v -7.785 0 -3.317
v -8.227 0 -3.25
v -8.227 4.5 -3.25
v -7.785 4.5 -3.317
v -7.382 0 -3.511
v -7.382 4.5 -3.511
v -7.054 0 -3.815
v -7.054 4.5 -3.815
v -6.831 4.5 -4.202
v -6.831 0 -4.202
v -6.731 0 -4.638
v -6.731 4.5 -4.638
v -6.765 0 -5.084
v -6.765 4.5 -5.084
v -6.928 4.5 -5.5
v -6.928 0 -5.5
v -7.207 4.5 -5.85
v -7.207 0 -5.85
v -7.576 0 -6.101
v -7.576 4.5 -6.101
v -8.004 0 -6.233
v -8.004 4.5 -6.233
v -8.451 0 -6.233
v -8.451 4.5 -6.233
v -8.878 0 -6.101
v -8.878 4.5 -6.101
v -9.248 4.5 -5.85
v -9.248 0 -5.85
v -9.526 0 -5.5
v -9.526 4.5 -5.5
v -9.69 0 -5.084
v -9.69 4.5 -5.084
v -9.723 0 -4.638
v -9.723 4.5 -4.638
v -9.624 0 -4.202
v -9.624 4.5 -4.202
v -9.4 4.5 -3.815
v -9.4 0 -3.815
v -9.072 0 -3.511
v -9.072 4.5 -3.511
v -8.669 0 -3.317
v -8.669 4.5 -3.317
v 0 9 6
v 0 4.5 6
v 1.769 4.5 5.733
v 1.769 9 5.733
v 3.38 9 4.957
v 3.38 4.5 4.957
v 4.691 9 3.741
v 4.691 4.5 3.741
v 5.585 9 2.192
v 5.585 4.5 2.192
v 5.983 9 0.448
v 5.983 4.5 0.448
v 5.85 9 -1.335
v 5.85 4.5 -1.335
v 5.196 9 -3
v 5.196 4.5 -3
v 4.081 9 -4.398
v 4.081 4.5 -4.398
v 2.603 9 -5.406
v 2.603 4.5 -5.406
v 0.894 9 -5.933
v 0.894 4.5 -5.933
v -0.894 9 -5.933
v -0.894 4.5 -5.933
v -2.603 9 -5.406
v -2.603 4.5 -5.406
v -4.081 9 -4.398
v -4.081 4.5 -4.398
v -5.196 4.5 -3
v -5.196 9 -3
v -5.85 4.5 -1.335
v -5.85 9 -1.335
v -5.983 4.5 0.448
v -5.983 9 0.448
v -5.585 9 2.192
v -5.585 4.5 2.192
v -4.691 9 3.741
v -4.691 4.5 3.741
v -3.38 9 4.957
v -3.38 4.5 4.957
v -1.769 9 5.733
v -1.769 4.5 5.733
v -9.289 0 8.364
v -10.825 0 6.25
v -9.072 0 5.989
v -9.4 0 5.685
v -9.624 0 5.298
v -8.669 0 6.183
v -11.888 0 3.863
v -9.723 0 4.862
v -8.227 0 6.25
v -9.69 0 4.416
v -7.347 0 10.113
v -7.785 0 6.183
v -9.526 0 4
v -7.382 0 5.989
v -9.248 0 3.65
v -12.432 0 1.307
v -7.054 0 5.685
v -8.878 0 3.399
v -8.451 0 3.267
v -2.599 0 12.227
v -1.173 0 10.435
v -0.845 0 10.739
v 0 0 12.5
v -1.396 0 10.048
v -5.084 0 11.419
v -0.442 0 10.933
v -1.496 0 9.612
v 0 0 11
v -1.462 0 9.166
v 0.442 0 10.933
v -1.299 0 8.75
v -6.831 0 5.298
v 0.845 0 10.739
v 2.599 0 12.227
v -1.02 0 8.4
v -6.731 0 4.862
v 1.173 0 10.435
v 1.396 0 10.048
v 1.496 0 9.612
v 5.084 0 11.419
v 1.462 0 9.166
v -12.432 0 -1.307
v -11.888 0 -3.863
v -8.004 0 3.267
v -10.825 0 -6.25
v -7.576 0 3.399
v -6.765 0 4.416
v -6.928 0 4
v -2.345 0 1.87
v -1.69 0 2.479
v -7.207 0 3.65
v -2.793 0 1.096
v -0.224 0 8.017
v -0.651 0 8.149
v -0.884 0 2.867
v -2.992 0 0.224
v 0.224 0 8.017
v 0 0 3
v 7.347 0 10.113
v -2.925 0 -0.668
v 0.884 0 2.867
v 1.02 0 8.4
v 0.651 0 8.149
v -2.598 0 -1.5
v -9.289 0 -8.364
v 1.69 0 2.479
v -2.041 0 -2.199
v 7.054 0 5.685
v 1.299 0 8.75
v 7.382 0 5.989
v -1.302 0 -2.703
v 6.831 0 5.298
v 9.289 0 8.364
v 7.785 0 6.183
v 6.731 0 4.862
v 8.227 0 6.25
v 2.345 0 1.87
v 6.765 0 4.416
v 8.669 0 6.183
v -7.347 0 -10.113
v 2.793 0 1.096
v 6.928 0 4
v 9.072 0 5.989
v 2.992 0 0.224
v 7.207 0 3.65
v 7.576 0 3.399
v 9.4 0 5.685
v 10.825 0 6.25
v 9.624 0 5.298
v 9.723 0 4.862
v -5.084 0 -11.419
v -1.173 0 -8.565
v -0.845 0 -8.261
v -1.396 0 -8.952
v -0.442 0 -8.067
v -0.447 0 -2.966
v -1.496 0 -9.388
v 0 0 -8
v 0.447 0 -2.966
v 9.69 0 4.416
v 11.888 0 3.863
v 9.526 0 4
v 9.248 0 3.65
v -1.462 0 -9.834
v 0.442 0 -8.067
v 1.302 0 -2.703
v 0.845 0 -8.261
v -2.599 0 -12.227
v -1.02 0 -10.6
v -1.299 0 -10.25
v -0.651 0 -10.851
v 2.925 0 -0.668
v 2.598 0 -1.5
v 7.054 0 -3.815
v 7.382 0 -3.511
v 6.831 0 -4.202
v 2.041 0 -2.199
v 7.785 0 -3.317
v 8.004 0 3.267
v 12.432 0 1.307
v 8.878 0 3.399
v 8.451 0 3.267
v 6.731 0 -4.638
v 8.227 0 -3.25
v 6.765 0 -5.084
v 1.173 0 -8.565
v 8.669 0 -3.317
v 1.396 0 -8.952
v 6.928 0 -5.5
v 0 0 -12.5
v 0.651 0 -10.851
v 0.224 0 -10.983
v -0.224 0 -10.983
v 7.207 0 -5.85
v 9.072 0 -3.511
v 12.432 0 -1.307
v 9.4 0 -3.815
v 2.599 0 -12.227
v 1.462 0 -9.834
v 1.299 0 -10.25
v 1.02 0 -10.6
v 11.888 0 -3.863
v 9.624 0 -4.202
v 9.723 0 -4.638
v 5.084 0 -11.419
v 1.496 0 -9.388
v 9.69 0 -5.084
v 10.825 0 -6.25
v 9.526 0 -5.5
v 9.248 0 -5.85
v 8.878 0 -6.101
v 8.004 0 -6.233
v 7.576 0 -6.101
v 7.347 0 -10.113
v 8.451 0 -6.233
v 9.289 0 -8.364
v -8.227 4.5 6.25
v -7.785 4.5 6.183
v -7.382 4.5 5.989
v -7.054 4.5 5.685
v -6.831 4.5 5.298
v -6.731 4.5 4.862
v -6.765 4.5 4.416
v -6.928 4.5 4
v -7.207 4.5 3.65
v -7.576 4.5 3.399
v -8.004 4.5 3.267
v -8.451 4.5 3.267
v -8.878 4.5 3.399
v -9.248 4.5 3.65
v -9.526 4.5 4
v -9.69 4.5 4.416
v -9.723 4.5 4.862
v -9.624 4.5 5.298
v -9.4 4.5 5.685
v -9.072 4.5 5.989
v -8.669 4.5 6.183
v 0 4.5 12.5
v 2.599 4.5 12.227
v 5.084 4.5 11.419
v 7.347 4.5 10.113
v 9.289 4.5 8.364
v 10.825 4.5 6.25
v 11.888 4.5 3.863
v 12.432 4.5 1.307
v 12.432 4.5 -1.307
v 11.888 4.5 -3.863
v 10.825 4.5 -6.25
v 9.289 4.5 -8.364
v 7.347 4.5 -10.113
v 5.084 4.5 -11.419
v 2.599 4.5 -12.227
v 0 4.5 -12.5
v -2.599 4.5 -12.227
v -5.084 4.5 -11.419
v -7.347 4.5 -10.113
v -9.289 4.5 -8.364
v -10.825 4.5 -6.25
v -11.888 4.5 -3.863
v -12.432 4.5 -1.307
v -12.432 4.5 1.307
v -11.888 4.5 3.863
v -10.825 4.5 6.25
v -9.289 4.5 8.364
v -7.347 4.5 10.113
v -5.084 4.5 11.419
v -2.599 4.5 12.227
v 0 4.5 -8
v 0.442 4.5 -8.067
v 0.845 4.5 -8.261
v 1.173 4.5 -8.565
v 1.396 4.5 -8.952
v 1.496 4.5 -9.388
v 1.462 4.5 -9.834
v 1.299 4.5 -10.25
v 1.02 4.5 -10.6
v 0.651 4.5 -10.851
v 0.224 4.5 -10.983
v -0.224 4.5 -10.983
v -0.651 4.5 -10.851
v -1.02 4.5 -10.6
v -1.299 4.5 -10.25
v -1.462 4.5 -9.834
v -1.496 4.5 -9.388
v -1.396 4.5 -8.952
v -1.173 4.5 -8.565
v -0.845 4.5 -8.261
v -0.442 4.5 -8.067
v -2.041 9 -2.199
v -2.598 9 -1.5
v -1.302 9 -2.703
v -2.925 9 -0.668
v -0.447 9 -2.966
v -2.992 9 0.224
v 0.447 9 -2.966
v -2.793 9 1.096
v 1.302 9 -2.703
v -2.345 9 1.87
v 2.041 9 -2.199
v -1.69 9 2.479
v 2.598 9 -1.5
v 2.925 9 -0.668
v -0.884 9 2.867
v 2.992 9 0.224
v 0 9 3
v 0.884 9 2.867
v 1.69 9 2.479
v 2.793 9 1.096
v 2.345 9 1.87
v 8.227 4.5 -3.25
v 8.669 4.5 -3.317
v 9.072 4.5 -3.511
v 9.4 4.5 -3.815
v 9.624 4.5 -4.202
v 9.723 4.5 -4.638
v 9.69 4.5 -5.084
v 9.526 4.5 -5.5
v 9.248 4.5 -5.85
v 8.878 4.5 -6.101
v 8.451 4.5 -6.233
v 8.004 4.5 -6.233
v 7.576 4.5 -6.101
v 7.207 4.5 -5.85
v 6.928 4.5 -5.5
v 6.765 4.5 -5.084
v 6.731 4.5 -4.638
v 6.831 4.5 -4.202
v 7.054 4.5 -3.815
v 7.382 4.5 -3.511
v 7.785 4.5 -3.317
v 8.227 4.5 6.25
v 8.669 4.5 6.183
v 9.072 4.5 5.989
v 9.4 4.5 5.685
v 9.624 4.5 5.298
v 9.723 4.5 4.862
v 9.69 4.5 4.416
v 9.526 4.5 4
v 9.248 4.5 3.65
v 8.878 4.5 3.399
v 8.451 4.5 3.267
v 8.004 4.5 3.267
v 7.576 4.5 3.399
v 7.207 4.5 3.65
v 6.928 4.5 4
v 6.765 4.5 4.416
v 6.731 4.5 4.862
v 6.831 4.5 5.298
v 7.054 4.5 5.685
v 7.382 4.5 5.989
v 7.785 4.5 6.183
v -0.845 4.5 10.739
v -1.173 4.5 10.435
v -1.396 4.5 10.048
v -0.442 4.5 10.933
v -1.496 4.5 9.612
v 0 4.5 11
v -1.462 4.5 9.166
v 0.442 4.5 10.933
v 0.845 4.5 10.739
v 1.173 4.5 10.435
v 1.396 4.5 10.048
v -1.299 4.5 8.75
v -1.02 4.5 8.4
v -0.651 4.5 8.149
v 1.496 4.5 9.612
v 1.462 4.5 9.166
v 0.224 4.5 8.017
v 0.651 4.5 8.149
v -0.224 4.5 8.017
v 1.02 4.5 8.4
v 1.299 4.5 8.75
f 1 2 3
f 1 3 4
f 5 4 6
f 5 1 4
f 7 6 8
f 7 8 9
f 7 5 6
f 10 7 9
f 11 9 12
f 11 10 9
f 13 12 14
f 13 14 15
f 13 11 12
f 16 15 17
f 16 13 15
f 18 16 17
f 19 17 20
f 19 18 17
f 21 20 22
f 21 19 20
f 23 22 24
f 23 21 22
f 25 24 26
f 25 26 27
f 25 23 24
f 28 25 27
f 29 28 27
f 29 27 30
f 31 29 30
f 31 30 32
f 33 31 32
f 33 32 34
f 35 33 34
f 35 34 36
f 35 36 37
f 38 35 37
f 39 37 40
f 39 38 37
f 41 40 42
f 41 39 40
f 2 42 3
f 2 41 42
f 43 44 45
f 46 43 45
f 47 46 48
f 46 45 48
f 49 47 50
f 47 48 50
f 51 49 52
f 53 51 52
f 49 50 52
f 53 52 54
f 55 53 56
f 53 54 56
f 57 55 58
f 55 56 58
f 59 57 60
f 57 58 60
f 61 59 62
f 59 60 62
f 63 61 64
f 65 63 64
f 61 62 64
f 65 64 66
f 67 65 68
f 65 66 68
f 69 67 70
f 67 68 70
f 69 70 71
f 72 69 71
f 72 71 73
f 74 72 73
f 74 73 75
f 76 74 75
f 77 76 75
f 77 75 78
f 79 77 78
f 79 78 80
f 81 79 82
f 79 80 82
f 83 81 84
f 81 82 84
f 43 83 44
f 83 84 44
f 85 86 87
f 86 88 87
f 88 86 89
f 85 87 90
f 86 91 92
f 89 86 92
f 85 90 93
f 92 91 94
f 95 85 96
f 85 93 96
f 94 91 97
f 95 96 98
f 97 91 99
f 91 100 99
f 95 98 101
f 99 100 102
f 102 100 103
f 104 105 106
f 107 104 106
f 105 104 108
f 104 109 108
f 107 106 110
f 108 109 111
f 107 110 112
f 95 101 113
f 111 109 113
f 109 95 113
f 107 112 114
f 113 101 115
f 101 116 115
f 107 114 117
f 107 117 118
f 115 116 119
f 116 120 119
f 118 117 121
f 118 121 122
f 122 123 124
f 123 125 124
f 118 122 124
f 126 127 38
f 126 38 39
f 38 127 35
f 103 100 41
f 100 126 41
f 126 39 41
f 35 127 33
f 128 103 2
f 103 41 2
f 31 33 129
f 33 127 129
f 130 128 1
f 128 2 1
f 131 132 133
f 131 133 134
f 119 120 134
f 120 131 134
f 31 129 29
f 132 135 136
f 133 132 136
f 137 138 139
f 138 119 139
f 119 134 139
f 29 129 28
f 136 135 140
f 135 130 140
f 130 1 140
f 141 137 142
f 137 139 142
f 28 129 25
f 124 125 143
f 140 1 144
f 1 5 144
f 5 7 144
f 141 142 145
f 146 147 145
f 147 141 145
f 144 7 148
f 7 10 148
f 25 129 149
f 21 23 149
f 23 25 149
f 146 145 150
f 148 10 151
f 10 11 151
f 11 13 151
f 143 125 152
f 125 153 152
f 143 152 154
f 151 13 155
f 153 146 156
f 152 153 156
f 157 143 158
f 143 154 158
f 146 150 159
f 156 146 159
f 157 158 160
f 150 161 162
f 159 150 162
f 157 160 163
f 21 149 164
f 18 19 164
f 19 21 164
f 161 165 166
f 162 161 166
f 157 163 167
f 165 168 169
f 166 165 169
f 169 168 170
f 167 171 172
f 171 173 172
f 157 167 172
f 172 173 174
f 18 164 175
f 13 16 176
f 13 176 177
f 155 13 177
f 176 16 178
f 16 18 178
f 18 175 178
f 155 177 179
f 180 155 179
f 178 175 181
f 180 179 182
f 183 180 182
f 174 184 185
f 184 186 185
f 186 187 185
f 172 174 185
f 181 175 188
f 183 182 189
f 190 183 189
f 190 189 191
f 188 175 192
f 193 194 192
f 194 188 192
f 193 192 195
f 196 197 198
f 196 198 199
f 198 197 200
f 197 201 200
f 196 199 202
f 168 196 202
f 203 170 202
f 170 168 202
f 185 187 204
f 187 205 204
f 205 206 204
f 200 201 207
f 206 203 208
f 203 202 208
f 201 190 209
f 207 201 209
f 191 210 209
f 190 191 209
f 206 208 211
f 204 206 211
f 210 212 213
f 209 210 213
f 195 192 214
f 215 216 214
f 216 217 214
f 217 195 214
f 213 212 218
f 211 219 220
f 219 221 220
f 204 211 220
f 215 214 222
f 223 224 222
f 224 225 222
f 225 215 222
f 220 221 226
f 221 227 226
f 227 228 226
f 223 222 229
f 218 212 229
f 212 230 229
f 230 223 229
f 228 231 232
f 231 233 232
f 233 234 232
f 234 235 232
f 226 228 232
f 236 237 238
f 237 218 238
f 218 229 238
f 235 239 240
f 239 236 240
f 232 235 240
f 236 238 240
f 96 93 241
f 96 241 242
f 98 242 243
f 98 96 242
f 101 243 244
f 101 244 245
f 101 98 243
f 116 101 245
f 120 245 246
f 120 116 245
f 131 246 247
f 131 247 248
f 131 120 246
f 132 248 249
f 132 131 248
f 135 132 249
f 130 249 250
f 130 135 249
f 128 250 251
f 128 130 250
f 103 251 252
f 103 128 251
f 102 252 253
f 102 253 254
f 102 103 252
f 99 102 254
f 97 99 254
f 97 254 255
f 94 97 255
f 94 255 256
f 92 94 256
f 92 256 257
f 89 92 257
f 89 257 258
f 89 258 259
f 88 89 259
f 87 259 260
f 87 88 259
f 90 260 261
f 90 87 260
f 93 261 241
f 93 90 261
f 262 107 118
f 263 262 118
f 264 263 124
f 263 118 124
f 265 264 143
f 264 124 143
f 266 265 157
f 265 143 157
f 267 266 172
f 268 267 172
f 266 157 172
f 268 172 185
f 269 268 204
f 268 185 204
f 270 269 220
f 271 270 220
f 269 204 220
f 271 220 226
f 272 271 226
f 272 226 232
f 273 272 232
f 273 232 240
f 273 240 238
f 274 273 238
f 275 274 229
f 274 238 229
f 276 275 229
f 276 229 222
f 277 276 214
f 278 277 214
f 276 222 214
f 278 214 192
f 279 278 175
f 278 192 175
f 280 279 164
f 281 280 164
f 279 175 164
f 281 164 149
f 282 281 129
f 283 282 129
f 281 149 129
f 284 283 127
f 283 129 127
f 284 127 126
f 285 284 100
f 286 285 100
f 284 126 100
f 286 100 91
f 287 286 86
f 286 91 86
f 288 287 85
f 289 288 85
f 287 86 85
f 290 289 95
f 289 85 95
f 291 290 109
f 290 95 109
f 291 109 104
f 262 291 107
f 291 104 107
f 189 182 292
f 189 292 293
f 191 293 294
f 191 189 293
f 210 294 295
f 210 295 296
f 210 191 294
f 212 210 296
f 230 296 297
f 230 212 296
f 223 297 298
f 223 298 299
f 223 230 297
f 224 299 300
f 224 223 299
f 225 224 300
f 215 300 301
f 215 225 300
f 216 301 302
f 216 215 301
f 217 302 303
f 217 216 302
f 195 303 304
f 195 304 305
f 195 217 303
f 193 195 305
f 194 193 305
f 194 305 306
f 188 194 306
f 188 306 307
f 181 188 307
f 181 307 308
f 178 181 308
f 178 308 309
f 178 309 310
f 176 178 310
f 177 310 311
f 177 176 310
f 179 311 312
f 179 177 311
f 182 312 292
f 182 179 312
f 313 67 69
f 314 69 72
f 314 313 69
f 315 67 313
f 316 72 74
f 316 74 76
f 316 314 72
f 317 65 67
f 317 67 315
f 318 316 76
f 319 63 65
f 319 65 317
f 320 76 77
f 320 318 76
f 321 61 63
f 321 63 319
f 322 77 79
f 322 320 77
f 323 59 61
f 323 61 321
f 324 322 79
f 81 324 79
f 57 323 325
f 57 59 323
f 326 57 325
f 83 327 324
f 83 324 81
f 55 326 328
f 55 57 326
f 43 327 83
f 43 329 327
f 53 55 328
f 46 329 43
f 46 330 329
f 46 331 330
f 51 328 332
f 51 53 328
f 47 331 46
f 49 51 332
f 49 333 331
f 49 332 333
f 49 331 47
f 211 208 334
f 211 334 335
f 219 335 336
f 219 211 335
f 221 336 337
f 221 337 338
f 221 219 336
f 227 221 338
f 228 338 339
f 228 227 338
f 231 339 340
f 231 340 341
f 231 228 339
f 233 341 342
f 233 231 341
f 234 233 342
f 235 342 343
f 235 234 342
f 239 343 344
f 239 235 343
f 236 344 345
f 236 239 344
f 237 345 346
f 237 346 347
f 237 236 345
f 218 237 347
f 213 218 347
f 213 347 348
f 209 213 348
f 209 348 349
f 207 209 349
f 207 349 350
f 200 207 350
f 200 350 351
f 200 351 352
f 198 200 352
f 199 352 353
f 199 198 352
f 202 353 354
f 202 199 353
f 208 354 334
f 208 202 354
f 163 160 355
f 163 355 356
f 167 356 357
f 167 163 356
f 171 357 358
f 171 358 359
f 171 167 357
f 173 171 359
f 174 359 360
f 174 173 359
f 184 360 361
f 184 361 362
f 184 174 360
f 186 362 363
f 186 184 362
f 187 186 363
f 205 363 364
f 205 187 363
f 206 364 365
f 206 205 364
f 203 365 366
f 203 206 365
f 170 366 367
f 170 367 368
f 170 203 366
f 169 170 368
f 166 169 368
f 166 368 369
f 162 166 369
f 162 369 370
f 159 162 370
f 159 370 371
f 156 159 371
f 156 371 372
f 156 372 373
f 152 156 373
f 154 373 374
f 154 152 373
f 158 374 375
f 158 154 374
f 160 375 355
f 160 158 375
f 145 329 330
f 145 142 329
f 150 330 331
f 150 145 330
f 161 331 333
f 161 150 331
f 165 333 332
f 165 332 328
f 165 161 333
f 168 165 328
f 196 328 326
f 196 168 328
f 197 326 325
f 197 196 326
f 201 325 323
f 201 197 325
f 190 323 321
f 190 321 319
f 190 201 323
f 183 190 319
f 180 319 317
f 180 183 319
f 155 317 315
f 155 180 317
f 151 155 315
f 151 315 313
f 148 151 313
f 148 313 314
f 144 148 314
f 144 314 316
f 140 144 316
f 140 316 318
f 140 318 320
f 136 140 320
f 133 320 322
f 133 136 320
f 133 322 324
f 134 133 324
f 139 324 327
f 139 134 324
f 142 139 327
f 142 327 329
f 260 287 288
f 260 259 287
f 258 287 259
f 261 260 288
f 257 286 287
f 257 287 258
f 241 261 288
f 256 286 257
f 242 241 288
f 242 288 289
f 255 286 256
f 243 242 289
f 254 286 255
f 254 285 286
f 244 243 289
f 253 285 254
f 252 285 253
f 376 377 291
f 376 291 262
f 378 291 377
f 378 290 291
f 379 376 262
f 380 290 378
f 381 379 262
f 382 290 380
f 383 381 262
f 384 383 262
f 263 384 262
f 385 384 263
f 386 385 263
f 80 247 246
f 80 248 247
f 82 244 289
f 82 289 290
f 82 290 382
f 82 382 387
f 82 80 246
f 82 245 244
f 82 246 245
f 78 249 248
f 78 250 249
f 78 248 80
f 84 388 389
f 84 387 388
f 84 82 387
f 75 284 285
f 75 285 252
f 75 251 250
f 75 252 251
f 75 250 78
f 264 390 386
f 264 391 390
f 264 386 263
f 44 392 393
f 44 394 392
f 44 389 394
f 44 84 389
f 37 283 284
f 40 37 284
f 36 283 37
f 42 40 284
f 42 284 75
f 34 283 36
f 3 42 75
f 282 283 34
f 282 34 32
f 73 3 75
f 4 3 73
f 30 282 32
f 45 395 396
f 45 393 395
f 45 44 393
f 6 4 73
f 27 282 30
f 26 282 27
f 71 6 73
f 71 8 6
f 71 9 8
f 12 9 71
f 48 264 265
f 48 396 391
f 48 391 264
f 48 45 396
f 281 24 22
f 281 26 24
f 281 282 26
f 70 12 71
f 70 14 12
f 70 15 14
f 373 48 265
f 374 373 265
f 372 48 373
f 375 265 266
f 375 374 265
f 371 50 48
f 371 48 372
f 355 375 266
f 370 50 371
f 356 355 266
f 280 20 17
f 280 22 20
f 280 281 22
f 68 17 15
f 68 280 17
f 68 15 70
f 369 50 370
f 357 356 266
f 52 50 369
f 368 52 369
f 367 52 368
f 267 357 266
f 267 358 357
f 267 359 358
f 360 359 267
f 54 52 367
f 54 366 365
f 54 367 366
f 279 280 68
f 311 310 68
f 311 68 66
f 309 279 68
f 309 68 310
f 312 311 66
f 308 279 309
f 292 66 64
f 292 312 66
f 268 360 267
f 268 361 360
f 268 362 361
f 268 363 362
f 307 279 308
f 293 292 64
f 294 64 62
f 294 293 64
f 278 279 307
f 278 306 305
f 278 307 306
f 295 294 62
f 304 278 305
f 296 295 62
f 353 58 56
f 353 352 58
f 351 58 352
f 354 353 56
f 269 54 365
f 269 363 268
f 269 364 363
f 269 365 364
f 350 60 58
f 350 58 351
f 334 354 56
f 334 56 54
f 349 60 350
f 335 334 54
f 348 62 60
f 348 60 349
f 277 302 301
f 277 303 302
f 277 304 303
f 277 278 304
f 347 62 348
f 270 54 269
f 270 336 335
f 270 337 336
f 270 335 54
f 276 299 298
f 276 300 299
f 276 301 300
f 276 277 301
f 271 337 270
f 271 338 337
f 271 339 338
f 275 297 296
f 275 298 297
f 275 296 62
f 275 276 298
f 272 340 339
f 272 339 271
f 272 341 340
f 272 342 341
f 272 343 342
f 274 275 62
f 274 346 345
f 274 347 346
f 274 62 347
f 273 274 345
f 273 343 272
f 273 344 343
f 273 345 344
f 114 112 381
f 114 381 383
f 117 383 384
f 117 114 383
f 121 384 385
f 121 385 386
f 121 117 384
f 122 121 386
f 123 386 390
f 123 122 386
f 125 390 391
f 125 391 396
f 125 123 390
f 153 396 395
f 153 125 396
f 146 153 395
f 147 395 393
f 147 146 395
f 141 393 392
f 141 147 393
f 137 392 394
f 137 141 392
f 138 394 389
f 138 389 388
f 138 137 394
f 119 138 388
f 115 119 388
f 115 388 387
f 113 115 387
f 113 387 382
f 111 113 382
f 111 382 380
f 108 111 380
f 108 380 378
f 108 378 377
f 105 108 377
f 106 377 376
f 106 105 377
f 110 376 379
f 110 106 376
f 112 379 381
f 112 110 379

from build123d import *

# Parameters (mm, degrees)
SKETCH1_R           = 12.5
SKETCH1_R_2         = 6
SKETCH1_R_3         = 1.5
SKETCH1_R_4         = 3
BOSS_EXTRUDE1_DEPTH = 4.5
BOSS_EXTRUDE2_START = 4.5
SKETCH1_3_R         = 6
SKETCH1_3_R_2       = 3
BOSS_EXTRUDE2_DEPTH = 4.5


with BuildPart() as part:
    # Sketch1 → Boss-Extrude1 (new body)
    # profile 1 of 2: a face of its own
    with BuildSketch(Plane(origin=(0, 0, 0), x_dir=(1, 0, 0), z_dir=(0, 1, 0))):
        with Locations(Location((0, 0, 0), (0, 0, 270))):
            Circle(SKETCH1_R)
        Circle(SKETCH1_R_2, mode=Mode.SUBTRACT)
        with Locations(Location((-8.227241336, 4.75, 0), (0, 0, 270))):
            Circle(SKETCH1_R_3, mode=Mode.SUBTRACT)
        with Locations(Location((-8.227241336, -4.75, 0), (0, 0, 270))):
            Circle(SKETCH1_R_3, mode=Mode.SUBTRACT)
        with Locations(Location((0, -9.5, 0), (0, 0, 270))):
            Circle(SKETCH1_R_3, mode=Mode.SUBTRACT)
        with Locations(Location((8.227241336, -4.75, 0), (0, 0, 270))):
            Circle(SKETCH1_R_3, mode=Mode.SUBTRACT)
        with Locations(Location((8.227241336, 4.75, 0), (0, 0, 270))):
            Circle(SKETCH1_R_3, mode=Mode.SUBTRACT)
        with Locations(Location((0, 9.5, 0), (0, 0, 270))):
            Circle(SKETCH1_R_3, mode=Mode.SUBTRACT)
    # profile 2 of 2: a face of its own
    with BuildSketch(Plane(origin=(0, 0, 0), x_dir=(1, 0, 0), z_dir=(0, 1, 0))):
        Circle(SKETCH1_R_2)
        with Locations(Location((0, 0, 0), (0, 0, 270))):
            Circle(SKETCH1_R_4, mode=Mode.SUBTRACT)
    extrude(amount=BOSS_EXTRUDE1_DEPTH)

    # Sketch1<3> → Boss-Extrude2 (add)
    with BuildSketch(Plane(origin=(0, 0, 0), x_dir=(1, 0, 0), z_dir=(0, 1, 0)).offset(BOSS_EXTRUDE2_START)):
        with Locations(Location((0, 0, 0), (0, 0, 270))):
            Circle(SKETCH1_3_R)
        with Locations(Location((0, 0, 0), (0, 0, 270))):
            Circle(SKETCH1_3_R_2, mode=Mode.SUBTRACT)
    extrude(amount=BOSS_EXTRUDE2_DEPTH)


solid = part.part
